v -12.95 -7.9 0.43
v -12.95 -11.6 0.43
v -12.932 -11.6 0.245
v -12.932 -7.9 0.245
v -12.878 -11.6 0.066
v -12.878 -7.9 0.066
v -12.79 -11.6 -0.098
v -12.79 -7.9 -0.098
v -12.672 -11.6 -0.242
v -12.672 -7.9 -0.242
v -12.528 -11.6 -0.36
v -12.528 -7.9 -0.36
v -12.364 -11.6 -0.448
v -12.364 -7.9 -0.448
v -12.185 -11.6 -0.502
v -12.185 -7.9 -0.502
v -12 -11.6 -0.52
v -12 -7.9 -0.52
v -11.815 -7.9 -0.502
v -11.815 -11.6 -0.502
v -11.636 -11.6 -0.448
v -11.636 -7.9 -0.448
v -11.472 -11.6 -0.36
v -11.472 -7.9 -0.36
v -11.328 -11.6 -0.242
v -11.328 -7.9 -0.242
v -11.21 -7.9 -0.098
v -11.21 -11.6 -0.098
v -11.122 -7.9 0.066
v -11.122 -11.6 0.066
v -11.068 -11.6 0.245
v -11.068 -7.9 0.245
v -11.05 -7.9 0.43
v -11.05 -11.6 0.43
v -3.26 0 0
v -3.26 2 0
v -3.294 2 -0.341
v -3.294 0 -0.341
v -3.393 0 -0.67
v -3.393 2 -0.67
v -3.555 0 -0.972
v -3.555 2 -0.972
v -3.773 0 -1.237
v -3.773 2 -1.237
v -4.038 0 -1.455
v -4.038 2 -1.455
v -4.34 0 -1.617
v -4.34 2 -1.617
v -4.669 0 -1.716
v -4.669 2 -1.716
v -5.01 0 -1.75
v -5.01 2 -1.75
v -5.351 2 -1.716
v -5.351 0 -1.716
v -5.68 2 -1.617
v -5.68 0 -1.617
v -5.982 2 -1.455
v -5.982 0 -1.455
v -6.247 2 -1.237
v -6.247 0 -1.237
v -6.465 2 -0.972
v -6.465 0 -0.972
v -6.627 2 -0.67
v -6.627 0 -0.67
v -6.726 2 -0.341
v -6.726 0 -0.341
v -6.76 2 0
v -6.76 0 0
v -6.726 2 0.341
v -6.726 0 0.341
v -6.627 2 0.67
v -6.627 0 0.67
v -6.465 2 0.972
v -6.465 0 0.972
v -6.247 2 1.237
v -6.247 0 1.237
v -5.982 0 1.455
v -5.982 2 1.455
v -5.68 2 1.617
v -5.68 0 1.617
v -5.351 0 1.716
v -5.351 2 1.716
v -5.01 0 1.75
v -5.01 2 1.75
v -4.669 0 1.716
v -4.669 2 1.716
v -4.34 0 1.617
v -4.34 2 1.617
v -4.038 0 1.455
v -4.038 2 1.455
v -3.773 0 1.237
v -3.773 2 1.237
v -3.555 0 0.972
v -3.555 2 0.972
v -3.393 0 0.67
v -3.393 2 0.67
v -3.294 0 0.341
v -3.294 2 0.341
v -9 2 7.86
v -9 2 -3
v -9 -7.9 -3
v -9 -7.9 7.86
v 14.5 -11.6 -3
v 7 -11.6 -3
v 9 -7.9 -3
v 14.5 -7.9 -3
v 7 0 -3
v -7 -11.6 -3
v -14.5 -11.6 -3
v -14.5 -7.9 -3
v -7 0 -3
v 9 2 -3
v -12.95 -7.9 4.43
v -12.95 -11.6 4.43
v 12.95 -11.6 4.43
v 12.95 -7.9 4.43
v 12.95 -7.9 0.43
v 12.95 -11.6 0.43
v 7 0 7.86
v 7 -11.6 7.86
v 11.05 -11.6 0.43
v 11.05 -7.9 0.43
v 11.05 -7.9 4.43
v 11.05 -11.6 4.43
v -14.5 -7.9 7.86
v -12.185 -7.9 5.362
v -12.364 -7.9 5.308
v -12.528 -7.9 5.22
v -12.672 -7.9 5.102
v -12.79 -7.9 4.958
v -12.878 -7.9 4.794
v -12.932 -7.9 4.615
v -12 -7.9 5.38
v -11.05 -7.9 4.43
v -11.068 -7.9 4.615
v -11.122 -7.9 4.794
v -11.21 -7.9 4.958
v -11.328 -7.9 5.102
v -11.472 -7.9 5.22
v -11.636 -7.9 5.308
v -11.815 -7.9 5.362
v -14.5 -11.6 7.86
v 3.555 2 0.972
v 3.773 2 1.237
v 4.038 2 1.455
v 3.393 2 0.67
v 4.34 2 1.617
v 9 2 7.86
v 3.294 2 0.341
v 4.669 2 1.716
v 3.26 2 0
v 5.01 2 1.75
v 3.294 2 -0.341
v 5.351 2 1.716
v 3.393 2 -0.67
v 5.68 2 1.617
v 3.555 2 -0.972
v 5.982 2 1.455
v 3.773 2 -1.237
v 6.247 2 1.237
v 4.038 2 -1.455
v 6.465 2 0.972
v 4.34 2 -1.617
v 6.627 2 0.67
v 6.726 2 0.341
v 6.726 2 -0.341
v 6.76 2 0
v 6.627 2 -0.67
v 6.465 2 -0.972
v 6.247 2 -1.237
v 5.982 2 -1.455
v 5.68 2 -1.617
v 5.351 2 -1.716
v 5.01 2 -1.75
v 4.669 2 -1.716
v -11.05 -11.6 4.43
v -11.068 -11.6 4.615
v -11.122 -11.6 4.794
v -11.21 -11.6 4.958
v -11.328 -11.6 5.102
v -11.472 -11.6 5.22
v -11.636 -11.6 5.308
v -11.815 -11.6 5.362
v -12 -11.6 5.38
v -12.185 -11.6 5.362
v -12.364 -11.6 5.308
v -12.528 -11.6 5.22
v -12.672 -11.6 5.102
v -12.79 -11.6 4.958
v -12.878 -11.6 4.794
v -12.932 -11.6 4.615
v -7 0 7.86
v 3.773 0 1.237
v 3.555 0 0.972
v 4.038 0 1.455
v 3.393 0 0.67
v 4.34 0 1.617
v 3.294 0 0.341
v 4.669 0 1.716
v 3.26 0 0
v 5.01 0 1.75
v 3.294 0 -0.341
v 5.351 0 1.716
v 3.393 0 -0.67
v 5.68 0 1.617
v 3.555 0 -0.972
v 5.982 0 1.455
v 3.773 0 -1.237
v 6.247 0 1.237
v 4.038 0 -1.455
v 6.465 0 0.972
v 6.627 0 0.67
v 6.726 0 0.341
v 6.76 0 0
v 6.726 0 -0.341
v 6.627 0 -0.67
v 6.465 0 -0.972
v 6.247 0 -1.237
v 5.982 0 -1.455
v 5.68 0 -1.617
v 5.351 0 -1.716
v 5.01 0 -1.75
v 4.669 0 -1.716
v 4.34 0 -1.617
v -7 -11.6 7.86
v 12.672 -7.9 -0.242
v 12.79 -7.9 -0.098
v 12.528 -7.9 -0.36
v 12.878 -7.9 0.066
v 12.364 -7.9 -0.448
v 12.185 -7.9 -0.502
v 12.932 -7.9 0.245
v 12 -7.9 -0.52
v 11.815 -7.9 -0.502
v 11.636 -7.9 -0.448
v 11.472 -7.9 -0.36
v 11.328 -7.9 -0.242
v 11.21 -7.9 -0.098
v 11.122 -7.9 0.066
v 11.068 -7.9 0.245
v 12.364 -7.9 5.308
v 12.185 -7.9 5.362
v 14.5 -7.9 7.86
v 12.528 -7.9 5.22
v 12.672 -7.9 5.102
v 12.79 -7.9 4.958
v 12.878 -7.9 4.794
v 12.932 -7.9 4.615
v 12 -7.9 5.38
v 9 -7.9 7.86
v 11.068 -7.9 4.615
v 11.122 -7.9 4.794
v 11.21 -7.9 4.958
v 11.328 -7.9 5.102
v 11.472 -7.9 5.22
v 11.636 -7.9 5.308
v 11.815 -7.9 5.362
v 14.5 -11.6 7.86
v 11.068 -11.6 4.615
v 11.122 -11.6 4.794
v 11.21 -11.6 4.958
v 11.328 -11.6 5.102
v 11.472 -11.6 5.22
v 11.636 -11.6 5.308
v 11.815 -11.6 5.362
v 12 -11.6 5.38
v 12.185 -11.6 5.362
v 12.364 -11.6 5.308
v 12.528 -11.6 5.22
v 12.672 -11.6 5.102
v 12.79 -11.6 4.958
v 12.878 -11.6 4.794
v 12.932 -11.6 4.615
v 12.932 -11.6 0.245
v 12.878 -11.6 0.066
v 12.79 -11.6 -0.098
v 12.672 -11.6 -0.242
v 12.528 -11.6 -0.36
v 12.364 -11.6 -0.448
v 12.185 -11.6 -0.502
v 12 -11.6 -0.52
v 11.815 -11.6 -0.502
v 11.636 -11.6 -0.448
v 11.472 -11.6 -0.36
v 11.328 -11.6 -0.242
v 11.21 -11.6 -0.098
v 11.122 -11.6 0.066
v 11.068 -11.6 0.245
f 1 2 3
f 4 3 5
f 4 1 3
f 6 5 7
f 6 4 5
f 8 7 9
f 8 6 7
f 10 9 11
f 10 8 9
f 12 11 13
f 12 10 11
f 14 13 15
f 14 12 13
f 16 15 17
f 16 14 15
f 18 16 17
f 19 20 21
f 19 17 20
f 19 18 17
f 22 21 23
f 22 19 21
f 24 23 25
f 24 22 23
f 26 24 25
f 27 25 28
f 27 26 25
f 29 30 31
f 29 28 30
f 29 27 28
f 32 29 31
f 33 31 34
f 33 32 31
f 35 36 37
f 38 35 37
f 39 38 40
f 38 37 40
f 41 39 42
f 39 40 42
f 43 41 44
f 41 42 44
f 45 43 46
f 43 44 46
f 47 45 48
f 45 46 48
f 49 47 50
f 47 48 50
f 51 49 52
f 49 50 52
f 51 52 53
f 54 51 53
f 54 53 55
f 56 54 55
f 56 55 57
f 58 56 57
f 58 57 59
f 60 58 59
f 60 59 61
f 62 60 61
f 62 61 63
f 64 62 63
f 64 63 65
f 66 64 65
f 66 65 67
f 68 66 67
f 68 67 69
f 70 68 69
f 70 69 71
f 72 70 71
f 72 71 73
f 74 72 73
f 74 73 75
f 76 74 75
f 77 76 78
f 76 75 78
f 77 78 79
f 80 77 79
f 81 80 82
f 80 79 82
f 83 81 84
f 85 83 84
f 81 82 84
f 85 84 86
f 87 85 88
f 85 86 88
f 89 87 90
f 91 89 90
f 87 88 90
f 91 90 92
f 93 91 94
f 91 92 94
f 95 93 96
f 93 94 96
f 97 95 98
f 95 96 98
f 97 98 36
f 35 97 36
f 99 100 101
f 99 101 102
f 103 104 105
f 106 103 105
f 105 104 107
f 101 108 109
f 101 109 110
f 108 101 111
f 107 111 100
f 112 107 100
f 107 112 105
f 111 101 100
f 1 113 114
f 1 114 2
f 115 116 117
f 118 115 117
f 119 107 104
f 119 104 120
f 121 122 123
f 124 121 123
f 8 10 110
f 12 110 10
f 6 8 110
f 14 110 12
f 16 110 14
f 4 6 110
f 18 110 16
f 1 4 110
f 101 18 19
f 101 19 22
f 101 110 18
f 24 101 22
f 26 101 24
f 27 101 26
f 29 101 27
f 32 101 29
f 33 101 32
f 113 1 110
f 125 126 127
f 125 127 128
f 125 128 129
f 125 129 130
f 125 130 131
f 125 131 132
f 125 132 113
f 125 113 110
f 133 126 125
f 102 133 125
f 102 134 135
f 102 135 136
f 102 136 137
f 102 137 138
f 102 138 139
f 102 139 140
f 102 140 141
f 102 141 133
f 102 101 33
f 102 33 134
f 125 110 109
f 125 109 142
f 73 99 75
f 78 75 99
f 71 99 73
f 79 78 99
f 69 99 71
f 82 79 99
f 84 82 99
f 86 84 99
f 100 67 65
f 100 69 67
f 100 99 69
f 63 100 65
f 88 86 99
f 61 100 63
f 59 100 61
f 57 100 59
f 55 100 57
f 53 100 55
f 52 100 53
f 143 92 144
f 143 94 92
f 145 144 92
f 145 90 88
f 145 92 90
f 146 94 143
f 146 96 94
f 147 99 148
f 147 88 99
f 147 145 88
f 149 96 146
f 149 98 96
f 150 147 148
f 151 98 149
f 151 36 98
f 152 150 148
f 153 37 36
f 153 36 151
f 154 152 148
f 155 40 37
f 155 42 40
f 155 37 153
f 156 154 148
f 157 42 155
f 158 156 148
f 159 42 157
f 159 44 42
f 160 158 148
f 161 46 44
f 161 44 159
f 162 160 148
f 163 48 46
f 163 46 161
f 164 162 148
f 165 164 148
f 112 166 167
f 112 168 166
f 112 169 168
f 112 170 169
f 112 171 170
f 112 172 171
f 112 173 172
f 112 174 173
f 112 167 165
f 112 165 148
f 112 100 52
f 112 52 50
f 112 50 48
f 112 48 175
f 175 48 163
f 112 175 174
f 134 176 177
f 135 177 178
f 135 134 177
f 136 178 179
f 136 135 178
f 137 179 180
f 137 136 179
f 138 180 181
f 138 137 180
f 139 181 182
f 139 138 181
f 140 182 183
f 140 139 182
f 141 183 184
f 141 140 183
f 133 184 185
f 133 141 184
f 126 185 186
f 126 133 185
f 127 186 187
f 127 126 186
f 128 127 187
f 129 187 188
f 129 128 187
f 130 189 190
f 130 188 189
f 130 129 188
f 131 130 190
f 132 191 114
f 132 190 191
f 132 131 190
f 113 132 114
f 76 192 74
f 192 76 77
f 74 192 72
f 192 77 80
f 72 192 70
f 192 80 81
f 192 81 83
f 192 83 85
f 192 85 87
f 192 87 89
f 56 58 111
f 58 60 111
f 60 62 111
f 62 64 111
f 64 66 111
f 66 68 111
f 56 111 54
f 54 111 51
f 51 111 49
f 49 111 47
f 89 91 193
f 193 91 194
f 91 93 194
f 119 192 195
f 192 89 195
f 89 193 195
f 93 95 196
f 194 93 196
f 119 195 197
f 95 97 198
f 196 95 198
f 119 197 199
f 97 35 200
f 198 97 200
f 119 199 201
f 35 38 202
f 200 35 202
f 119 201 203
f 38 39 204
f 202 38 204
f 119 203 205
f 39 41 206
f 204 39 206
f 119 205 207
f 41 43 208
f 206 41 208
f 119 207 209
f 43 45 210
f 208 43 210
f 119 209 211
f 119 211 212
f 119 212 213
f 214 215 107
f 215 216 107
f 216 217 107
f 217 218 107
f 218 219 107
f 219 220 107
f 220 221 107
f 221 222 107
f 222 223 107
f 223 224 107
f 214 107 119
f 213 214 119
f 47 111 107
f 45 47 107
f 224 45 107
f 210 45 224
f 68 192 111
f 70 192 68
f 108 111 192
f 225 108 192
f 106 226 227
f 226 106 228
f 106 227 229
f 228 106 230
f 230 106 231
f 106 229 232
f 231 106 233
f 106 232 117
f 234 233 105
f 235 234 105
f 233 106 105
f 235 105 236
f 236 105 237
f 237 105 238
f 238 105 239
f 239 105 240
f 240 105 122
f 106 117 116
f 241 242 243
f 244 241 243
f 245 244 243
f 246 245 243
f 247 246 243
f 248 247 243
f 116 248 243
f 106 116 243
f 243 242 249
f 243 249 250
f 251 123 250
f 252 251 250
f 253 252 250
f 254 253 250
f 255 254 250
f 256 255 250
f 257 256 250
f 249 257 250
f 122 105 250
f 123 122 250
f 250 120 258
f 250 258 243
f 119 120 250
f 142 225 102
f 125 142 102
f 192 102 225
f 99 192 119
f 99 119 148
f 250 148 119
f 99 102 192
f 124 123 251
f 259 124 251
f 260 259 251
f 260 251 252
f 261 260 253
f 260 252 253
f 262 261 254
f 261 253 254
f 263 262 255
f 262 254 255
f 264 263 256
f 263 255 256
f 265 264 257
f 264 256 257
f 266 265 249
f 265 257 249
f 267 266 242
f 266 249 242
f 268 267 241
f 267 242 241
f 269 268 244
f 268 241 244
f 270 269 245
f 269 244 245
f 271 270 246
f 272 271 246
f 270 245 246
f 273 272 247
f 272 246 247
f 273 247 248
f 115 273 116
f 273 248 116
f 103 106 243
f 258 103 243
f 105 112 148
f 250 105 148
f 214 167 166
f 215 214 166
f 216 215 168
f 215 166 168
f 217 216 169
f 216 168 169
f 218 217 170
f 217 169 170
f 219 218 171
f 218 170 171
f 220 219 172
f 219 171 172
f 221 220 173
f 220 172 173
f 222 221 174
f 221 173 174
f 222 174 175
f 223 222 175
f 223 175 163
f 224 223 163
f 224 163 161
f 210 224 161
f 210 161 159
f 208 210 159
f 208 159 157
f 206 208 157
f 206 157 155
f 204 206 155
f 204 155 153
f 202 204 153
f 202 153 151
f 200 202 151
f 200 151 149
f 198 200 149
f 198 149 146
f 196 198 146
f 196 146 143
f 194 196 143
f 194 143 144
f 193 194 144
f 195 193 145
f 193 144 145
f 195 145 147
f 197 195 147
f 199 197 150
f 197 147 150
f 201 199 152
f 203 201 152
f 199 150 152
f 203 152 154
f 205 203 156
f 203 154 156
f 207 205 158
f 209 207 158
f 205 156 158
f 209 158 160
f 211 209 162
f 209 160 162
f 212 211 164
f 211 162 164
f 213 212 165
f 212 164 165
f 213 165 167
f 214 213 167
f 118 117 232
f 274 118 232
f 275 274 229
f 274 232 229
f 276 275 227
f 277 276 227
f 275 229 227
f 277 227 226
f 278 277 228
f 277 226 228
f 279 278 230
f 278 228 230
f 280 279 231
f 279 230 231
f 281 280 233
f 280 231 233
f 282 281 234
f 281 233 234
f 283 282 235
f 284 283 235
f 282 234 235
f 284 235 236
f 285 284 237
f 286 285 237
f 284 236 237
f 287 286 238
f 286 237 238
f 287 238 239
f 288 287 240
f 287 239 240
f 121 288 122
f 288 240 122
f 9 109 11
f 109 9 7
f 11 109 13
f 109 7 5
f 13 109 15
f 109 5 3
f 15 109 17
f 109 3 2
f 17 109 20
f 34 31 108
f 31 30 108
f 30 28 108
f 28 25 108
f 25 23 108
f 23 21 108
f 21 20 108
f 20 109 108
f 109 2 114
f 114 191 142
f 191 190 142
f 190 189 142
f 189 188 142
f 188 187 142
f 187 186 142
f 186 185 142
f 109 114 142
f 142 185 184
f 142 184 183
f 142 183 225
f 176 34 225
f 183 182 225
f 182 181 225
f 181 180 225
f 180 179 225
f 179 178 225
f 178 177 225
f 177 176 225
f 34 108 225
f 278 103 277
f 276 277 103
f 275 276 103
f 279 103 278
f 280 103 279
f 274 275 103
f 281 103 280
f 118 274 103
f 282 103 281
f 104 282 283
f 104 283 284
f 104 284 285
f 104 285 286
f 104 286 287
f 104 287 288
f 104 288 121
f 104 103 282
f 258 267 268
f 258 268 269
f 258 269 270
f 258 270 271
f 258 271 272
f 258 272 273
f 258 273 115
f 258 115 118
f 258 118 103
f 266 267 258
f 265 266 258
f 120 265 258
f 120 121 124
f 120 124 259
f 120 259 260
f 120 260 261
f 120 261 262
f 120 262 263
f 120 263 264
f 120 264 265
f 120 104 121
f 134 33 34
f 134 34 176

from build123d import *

# Parameters (mm, degrees)
SKETCH3_W           = 18
SKETCH3_H           = 6
BOSS_EXTRUDE1_DEPTH = 2
SKETCH4_R           = 1.75
CUT_EXTRUDE1_DEPTH  = 3
SKETCH5_W           = 18
SKETCH5_H           = 4.86
BOSS_EXTRUDE4_DEPTH = 2
SKETCH6_W           = 2
SKETCH6_H           = 10.86
BOSS_EXTRUDE5_DEPTH = 11.6
SKETCH7_W           = 10.86
SKETCH7_H           = 3.7
BOSS_EXTRUDE6_DEPTH = 5.5
CUT_EXTRUDE2_DEPTH  = 4.7


with BuildPart() as part:
    # Sketch3 → Boss-Extrude1 (new body)
    with BuildSketch(Plane(origin=(0, 0, 0), x_dir=(1, 0, 0), z_dir=(0, 1, 0))):
        Rectangle(SKETCH3_W, SKETCH3_H)
    extrude(amount=BOSS_EXTRUDE1_DEPTH)

    # Sketch4 → Cut-Extrude1 (cut, through all)
    with BuildSketch(Plane(origin=(0, 2, 0), x_dir=(1, 0, 0), z_dir=(0, 1, 0))):
        with Locations((-5.01, 0)):
            Circle(SKETCH4_R)
        with Locations((5.01, 0)):
            Circle(SKETCH4_R)
    extrude(amount=-CUT_EXTRUDE1_DEPTH, mode=Mode.SUBTRACT)

    # Sketch5 → Boss-Extrude4 (add)
    with BuildSketch(Plane(origin=(0, 0, 0), x_dir=(1, 0, 0), z_dir=(0, 1, 0))):
        with Locations((0, -5.43)):
            Rectangle(SKETCH5_W, SKETCH5_H)
    boss_extrude4 = extrude(amount=BOSS_EXTRUDE4_DEPTH)

    # Sketch6 → Boss-Extrude5 (add)
    with BuildSketch(Plane.XZ):
        with Locations((-8, 2.43)):
            Rectangle(SKETCH6_W, SKETCH6_H)
    boss_extrude5 = extrude(amount=BOSS_EXTRUDE5_DEPTH)

    # Sketch7 → Boss-Extrude6 (add)
    with BuildSketch(Plane.ZY.offset(9)):
        with Locations((2.43, -9.75)):
            Rectangle(SKETCH7_W, SKETCH7_H)
    boss_extrude6 = extrude(amount=BOSS_EXTRUDE6_DEPTH)

    # Sketch8 → Cut-Extrude2 (cut, through all)
    with BuildSketch(Plane(origin=(0, -7.9, 0), x_dir=(1, 0, 0), z_dir=(0, 1, 0))):
        with BuildLine():
            Line((-11.05, -0.43), (-11.05, -4.43))
            ThreePointArc((-11.05, -4.43), (-12, -5.38), (-12.95, -4.43))
            Line((-12.95, -4.43), (-12.95, -0.43))
            ThreePointArc((-12.95, -0.43), (-12, 0.52), (-11.05, -0.43))
        make_face()
    cut_extrude2 = extrude(amount=-CUT_EXTRUDE2_DEPTH, mode=Mode.SUBTRACT)

    # Mirror1: Boss-Extrude4, Boss-Extrude5, Boss-Extrude6, Cut-Extrude2 across plane
    add(boss_extrude4.mirror(Plane(origin=(0, 0, 0), x_dir=(0, 0, 1), z_dir=(1, 0, 0))))
    add(boss_extrude5.mirror(Plane(origin=(0, 0, 0), x_dir=(0, 0, 1), z_dir=(1, 0, 0))))
    add(boss_extrude6.mirror(Plane(origin=(0, 0, 0), x_dir=(0, 0, 1), z_dir=(1, 0, 0))))
    add(cut_extrude2.mirror(Plane(origin=(0, 0, 0), x_dir=(0, 0, 1), z_dir=(1, 0, 0))), mode=Mode.SUBTRACT)


solid = part.part
